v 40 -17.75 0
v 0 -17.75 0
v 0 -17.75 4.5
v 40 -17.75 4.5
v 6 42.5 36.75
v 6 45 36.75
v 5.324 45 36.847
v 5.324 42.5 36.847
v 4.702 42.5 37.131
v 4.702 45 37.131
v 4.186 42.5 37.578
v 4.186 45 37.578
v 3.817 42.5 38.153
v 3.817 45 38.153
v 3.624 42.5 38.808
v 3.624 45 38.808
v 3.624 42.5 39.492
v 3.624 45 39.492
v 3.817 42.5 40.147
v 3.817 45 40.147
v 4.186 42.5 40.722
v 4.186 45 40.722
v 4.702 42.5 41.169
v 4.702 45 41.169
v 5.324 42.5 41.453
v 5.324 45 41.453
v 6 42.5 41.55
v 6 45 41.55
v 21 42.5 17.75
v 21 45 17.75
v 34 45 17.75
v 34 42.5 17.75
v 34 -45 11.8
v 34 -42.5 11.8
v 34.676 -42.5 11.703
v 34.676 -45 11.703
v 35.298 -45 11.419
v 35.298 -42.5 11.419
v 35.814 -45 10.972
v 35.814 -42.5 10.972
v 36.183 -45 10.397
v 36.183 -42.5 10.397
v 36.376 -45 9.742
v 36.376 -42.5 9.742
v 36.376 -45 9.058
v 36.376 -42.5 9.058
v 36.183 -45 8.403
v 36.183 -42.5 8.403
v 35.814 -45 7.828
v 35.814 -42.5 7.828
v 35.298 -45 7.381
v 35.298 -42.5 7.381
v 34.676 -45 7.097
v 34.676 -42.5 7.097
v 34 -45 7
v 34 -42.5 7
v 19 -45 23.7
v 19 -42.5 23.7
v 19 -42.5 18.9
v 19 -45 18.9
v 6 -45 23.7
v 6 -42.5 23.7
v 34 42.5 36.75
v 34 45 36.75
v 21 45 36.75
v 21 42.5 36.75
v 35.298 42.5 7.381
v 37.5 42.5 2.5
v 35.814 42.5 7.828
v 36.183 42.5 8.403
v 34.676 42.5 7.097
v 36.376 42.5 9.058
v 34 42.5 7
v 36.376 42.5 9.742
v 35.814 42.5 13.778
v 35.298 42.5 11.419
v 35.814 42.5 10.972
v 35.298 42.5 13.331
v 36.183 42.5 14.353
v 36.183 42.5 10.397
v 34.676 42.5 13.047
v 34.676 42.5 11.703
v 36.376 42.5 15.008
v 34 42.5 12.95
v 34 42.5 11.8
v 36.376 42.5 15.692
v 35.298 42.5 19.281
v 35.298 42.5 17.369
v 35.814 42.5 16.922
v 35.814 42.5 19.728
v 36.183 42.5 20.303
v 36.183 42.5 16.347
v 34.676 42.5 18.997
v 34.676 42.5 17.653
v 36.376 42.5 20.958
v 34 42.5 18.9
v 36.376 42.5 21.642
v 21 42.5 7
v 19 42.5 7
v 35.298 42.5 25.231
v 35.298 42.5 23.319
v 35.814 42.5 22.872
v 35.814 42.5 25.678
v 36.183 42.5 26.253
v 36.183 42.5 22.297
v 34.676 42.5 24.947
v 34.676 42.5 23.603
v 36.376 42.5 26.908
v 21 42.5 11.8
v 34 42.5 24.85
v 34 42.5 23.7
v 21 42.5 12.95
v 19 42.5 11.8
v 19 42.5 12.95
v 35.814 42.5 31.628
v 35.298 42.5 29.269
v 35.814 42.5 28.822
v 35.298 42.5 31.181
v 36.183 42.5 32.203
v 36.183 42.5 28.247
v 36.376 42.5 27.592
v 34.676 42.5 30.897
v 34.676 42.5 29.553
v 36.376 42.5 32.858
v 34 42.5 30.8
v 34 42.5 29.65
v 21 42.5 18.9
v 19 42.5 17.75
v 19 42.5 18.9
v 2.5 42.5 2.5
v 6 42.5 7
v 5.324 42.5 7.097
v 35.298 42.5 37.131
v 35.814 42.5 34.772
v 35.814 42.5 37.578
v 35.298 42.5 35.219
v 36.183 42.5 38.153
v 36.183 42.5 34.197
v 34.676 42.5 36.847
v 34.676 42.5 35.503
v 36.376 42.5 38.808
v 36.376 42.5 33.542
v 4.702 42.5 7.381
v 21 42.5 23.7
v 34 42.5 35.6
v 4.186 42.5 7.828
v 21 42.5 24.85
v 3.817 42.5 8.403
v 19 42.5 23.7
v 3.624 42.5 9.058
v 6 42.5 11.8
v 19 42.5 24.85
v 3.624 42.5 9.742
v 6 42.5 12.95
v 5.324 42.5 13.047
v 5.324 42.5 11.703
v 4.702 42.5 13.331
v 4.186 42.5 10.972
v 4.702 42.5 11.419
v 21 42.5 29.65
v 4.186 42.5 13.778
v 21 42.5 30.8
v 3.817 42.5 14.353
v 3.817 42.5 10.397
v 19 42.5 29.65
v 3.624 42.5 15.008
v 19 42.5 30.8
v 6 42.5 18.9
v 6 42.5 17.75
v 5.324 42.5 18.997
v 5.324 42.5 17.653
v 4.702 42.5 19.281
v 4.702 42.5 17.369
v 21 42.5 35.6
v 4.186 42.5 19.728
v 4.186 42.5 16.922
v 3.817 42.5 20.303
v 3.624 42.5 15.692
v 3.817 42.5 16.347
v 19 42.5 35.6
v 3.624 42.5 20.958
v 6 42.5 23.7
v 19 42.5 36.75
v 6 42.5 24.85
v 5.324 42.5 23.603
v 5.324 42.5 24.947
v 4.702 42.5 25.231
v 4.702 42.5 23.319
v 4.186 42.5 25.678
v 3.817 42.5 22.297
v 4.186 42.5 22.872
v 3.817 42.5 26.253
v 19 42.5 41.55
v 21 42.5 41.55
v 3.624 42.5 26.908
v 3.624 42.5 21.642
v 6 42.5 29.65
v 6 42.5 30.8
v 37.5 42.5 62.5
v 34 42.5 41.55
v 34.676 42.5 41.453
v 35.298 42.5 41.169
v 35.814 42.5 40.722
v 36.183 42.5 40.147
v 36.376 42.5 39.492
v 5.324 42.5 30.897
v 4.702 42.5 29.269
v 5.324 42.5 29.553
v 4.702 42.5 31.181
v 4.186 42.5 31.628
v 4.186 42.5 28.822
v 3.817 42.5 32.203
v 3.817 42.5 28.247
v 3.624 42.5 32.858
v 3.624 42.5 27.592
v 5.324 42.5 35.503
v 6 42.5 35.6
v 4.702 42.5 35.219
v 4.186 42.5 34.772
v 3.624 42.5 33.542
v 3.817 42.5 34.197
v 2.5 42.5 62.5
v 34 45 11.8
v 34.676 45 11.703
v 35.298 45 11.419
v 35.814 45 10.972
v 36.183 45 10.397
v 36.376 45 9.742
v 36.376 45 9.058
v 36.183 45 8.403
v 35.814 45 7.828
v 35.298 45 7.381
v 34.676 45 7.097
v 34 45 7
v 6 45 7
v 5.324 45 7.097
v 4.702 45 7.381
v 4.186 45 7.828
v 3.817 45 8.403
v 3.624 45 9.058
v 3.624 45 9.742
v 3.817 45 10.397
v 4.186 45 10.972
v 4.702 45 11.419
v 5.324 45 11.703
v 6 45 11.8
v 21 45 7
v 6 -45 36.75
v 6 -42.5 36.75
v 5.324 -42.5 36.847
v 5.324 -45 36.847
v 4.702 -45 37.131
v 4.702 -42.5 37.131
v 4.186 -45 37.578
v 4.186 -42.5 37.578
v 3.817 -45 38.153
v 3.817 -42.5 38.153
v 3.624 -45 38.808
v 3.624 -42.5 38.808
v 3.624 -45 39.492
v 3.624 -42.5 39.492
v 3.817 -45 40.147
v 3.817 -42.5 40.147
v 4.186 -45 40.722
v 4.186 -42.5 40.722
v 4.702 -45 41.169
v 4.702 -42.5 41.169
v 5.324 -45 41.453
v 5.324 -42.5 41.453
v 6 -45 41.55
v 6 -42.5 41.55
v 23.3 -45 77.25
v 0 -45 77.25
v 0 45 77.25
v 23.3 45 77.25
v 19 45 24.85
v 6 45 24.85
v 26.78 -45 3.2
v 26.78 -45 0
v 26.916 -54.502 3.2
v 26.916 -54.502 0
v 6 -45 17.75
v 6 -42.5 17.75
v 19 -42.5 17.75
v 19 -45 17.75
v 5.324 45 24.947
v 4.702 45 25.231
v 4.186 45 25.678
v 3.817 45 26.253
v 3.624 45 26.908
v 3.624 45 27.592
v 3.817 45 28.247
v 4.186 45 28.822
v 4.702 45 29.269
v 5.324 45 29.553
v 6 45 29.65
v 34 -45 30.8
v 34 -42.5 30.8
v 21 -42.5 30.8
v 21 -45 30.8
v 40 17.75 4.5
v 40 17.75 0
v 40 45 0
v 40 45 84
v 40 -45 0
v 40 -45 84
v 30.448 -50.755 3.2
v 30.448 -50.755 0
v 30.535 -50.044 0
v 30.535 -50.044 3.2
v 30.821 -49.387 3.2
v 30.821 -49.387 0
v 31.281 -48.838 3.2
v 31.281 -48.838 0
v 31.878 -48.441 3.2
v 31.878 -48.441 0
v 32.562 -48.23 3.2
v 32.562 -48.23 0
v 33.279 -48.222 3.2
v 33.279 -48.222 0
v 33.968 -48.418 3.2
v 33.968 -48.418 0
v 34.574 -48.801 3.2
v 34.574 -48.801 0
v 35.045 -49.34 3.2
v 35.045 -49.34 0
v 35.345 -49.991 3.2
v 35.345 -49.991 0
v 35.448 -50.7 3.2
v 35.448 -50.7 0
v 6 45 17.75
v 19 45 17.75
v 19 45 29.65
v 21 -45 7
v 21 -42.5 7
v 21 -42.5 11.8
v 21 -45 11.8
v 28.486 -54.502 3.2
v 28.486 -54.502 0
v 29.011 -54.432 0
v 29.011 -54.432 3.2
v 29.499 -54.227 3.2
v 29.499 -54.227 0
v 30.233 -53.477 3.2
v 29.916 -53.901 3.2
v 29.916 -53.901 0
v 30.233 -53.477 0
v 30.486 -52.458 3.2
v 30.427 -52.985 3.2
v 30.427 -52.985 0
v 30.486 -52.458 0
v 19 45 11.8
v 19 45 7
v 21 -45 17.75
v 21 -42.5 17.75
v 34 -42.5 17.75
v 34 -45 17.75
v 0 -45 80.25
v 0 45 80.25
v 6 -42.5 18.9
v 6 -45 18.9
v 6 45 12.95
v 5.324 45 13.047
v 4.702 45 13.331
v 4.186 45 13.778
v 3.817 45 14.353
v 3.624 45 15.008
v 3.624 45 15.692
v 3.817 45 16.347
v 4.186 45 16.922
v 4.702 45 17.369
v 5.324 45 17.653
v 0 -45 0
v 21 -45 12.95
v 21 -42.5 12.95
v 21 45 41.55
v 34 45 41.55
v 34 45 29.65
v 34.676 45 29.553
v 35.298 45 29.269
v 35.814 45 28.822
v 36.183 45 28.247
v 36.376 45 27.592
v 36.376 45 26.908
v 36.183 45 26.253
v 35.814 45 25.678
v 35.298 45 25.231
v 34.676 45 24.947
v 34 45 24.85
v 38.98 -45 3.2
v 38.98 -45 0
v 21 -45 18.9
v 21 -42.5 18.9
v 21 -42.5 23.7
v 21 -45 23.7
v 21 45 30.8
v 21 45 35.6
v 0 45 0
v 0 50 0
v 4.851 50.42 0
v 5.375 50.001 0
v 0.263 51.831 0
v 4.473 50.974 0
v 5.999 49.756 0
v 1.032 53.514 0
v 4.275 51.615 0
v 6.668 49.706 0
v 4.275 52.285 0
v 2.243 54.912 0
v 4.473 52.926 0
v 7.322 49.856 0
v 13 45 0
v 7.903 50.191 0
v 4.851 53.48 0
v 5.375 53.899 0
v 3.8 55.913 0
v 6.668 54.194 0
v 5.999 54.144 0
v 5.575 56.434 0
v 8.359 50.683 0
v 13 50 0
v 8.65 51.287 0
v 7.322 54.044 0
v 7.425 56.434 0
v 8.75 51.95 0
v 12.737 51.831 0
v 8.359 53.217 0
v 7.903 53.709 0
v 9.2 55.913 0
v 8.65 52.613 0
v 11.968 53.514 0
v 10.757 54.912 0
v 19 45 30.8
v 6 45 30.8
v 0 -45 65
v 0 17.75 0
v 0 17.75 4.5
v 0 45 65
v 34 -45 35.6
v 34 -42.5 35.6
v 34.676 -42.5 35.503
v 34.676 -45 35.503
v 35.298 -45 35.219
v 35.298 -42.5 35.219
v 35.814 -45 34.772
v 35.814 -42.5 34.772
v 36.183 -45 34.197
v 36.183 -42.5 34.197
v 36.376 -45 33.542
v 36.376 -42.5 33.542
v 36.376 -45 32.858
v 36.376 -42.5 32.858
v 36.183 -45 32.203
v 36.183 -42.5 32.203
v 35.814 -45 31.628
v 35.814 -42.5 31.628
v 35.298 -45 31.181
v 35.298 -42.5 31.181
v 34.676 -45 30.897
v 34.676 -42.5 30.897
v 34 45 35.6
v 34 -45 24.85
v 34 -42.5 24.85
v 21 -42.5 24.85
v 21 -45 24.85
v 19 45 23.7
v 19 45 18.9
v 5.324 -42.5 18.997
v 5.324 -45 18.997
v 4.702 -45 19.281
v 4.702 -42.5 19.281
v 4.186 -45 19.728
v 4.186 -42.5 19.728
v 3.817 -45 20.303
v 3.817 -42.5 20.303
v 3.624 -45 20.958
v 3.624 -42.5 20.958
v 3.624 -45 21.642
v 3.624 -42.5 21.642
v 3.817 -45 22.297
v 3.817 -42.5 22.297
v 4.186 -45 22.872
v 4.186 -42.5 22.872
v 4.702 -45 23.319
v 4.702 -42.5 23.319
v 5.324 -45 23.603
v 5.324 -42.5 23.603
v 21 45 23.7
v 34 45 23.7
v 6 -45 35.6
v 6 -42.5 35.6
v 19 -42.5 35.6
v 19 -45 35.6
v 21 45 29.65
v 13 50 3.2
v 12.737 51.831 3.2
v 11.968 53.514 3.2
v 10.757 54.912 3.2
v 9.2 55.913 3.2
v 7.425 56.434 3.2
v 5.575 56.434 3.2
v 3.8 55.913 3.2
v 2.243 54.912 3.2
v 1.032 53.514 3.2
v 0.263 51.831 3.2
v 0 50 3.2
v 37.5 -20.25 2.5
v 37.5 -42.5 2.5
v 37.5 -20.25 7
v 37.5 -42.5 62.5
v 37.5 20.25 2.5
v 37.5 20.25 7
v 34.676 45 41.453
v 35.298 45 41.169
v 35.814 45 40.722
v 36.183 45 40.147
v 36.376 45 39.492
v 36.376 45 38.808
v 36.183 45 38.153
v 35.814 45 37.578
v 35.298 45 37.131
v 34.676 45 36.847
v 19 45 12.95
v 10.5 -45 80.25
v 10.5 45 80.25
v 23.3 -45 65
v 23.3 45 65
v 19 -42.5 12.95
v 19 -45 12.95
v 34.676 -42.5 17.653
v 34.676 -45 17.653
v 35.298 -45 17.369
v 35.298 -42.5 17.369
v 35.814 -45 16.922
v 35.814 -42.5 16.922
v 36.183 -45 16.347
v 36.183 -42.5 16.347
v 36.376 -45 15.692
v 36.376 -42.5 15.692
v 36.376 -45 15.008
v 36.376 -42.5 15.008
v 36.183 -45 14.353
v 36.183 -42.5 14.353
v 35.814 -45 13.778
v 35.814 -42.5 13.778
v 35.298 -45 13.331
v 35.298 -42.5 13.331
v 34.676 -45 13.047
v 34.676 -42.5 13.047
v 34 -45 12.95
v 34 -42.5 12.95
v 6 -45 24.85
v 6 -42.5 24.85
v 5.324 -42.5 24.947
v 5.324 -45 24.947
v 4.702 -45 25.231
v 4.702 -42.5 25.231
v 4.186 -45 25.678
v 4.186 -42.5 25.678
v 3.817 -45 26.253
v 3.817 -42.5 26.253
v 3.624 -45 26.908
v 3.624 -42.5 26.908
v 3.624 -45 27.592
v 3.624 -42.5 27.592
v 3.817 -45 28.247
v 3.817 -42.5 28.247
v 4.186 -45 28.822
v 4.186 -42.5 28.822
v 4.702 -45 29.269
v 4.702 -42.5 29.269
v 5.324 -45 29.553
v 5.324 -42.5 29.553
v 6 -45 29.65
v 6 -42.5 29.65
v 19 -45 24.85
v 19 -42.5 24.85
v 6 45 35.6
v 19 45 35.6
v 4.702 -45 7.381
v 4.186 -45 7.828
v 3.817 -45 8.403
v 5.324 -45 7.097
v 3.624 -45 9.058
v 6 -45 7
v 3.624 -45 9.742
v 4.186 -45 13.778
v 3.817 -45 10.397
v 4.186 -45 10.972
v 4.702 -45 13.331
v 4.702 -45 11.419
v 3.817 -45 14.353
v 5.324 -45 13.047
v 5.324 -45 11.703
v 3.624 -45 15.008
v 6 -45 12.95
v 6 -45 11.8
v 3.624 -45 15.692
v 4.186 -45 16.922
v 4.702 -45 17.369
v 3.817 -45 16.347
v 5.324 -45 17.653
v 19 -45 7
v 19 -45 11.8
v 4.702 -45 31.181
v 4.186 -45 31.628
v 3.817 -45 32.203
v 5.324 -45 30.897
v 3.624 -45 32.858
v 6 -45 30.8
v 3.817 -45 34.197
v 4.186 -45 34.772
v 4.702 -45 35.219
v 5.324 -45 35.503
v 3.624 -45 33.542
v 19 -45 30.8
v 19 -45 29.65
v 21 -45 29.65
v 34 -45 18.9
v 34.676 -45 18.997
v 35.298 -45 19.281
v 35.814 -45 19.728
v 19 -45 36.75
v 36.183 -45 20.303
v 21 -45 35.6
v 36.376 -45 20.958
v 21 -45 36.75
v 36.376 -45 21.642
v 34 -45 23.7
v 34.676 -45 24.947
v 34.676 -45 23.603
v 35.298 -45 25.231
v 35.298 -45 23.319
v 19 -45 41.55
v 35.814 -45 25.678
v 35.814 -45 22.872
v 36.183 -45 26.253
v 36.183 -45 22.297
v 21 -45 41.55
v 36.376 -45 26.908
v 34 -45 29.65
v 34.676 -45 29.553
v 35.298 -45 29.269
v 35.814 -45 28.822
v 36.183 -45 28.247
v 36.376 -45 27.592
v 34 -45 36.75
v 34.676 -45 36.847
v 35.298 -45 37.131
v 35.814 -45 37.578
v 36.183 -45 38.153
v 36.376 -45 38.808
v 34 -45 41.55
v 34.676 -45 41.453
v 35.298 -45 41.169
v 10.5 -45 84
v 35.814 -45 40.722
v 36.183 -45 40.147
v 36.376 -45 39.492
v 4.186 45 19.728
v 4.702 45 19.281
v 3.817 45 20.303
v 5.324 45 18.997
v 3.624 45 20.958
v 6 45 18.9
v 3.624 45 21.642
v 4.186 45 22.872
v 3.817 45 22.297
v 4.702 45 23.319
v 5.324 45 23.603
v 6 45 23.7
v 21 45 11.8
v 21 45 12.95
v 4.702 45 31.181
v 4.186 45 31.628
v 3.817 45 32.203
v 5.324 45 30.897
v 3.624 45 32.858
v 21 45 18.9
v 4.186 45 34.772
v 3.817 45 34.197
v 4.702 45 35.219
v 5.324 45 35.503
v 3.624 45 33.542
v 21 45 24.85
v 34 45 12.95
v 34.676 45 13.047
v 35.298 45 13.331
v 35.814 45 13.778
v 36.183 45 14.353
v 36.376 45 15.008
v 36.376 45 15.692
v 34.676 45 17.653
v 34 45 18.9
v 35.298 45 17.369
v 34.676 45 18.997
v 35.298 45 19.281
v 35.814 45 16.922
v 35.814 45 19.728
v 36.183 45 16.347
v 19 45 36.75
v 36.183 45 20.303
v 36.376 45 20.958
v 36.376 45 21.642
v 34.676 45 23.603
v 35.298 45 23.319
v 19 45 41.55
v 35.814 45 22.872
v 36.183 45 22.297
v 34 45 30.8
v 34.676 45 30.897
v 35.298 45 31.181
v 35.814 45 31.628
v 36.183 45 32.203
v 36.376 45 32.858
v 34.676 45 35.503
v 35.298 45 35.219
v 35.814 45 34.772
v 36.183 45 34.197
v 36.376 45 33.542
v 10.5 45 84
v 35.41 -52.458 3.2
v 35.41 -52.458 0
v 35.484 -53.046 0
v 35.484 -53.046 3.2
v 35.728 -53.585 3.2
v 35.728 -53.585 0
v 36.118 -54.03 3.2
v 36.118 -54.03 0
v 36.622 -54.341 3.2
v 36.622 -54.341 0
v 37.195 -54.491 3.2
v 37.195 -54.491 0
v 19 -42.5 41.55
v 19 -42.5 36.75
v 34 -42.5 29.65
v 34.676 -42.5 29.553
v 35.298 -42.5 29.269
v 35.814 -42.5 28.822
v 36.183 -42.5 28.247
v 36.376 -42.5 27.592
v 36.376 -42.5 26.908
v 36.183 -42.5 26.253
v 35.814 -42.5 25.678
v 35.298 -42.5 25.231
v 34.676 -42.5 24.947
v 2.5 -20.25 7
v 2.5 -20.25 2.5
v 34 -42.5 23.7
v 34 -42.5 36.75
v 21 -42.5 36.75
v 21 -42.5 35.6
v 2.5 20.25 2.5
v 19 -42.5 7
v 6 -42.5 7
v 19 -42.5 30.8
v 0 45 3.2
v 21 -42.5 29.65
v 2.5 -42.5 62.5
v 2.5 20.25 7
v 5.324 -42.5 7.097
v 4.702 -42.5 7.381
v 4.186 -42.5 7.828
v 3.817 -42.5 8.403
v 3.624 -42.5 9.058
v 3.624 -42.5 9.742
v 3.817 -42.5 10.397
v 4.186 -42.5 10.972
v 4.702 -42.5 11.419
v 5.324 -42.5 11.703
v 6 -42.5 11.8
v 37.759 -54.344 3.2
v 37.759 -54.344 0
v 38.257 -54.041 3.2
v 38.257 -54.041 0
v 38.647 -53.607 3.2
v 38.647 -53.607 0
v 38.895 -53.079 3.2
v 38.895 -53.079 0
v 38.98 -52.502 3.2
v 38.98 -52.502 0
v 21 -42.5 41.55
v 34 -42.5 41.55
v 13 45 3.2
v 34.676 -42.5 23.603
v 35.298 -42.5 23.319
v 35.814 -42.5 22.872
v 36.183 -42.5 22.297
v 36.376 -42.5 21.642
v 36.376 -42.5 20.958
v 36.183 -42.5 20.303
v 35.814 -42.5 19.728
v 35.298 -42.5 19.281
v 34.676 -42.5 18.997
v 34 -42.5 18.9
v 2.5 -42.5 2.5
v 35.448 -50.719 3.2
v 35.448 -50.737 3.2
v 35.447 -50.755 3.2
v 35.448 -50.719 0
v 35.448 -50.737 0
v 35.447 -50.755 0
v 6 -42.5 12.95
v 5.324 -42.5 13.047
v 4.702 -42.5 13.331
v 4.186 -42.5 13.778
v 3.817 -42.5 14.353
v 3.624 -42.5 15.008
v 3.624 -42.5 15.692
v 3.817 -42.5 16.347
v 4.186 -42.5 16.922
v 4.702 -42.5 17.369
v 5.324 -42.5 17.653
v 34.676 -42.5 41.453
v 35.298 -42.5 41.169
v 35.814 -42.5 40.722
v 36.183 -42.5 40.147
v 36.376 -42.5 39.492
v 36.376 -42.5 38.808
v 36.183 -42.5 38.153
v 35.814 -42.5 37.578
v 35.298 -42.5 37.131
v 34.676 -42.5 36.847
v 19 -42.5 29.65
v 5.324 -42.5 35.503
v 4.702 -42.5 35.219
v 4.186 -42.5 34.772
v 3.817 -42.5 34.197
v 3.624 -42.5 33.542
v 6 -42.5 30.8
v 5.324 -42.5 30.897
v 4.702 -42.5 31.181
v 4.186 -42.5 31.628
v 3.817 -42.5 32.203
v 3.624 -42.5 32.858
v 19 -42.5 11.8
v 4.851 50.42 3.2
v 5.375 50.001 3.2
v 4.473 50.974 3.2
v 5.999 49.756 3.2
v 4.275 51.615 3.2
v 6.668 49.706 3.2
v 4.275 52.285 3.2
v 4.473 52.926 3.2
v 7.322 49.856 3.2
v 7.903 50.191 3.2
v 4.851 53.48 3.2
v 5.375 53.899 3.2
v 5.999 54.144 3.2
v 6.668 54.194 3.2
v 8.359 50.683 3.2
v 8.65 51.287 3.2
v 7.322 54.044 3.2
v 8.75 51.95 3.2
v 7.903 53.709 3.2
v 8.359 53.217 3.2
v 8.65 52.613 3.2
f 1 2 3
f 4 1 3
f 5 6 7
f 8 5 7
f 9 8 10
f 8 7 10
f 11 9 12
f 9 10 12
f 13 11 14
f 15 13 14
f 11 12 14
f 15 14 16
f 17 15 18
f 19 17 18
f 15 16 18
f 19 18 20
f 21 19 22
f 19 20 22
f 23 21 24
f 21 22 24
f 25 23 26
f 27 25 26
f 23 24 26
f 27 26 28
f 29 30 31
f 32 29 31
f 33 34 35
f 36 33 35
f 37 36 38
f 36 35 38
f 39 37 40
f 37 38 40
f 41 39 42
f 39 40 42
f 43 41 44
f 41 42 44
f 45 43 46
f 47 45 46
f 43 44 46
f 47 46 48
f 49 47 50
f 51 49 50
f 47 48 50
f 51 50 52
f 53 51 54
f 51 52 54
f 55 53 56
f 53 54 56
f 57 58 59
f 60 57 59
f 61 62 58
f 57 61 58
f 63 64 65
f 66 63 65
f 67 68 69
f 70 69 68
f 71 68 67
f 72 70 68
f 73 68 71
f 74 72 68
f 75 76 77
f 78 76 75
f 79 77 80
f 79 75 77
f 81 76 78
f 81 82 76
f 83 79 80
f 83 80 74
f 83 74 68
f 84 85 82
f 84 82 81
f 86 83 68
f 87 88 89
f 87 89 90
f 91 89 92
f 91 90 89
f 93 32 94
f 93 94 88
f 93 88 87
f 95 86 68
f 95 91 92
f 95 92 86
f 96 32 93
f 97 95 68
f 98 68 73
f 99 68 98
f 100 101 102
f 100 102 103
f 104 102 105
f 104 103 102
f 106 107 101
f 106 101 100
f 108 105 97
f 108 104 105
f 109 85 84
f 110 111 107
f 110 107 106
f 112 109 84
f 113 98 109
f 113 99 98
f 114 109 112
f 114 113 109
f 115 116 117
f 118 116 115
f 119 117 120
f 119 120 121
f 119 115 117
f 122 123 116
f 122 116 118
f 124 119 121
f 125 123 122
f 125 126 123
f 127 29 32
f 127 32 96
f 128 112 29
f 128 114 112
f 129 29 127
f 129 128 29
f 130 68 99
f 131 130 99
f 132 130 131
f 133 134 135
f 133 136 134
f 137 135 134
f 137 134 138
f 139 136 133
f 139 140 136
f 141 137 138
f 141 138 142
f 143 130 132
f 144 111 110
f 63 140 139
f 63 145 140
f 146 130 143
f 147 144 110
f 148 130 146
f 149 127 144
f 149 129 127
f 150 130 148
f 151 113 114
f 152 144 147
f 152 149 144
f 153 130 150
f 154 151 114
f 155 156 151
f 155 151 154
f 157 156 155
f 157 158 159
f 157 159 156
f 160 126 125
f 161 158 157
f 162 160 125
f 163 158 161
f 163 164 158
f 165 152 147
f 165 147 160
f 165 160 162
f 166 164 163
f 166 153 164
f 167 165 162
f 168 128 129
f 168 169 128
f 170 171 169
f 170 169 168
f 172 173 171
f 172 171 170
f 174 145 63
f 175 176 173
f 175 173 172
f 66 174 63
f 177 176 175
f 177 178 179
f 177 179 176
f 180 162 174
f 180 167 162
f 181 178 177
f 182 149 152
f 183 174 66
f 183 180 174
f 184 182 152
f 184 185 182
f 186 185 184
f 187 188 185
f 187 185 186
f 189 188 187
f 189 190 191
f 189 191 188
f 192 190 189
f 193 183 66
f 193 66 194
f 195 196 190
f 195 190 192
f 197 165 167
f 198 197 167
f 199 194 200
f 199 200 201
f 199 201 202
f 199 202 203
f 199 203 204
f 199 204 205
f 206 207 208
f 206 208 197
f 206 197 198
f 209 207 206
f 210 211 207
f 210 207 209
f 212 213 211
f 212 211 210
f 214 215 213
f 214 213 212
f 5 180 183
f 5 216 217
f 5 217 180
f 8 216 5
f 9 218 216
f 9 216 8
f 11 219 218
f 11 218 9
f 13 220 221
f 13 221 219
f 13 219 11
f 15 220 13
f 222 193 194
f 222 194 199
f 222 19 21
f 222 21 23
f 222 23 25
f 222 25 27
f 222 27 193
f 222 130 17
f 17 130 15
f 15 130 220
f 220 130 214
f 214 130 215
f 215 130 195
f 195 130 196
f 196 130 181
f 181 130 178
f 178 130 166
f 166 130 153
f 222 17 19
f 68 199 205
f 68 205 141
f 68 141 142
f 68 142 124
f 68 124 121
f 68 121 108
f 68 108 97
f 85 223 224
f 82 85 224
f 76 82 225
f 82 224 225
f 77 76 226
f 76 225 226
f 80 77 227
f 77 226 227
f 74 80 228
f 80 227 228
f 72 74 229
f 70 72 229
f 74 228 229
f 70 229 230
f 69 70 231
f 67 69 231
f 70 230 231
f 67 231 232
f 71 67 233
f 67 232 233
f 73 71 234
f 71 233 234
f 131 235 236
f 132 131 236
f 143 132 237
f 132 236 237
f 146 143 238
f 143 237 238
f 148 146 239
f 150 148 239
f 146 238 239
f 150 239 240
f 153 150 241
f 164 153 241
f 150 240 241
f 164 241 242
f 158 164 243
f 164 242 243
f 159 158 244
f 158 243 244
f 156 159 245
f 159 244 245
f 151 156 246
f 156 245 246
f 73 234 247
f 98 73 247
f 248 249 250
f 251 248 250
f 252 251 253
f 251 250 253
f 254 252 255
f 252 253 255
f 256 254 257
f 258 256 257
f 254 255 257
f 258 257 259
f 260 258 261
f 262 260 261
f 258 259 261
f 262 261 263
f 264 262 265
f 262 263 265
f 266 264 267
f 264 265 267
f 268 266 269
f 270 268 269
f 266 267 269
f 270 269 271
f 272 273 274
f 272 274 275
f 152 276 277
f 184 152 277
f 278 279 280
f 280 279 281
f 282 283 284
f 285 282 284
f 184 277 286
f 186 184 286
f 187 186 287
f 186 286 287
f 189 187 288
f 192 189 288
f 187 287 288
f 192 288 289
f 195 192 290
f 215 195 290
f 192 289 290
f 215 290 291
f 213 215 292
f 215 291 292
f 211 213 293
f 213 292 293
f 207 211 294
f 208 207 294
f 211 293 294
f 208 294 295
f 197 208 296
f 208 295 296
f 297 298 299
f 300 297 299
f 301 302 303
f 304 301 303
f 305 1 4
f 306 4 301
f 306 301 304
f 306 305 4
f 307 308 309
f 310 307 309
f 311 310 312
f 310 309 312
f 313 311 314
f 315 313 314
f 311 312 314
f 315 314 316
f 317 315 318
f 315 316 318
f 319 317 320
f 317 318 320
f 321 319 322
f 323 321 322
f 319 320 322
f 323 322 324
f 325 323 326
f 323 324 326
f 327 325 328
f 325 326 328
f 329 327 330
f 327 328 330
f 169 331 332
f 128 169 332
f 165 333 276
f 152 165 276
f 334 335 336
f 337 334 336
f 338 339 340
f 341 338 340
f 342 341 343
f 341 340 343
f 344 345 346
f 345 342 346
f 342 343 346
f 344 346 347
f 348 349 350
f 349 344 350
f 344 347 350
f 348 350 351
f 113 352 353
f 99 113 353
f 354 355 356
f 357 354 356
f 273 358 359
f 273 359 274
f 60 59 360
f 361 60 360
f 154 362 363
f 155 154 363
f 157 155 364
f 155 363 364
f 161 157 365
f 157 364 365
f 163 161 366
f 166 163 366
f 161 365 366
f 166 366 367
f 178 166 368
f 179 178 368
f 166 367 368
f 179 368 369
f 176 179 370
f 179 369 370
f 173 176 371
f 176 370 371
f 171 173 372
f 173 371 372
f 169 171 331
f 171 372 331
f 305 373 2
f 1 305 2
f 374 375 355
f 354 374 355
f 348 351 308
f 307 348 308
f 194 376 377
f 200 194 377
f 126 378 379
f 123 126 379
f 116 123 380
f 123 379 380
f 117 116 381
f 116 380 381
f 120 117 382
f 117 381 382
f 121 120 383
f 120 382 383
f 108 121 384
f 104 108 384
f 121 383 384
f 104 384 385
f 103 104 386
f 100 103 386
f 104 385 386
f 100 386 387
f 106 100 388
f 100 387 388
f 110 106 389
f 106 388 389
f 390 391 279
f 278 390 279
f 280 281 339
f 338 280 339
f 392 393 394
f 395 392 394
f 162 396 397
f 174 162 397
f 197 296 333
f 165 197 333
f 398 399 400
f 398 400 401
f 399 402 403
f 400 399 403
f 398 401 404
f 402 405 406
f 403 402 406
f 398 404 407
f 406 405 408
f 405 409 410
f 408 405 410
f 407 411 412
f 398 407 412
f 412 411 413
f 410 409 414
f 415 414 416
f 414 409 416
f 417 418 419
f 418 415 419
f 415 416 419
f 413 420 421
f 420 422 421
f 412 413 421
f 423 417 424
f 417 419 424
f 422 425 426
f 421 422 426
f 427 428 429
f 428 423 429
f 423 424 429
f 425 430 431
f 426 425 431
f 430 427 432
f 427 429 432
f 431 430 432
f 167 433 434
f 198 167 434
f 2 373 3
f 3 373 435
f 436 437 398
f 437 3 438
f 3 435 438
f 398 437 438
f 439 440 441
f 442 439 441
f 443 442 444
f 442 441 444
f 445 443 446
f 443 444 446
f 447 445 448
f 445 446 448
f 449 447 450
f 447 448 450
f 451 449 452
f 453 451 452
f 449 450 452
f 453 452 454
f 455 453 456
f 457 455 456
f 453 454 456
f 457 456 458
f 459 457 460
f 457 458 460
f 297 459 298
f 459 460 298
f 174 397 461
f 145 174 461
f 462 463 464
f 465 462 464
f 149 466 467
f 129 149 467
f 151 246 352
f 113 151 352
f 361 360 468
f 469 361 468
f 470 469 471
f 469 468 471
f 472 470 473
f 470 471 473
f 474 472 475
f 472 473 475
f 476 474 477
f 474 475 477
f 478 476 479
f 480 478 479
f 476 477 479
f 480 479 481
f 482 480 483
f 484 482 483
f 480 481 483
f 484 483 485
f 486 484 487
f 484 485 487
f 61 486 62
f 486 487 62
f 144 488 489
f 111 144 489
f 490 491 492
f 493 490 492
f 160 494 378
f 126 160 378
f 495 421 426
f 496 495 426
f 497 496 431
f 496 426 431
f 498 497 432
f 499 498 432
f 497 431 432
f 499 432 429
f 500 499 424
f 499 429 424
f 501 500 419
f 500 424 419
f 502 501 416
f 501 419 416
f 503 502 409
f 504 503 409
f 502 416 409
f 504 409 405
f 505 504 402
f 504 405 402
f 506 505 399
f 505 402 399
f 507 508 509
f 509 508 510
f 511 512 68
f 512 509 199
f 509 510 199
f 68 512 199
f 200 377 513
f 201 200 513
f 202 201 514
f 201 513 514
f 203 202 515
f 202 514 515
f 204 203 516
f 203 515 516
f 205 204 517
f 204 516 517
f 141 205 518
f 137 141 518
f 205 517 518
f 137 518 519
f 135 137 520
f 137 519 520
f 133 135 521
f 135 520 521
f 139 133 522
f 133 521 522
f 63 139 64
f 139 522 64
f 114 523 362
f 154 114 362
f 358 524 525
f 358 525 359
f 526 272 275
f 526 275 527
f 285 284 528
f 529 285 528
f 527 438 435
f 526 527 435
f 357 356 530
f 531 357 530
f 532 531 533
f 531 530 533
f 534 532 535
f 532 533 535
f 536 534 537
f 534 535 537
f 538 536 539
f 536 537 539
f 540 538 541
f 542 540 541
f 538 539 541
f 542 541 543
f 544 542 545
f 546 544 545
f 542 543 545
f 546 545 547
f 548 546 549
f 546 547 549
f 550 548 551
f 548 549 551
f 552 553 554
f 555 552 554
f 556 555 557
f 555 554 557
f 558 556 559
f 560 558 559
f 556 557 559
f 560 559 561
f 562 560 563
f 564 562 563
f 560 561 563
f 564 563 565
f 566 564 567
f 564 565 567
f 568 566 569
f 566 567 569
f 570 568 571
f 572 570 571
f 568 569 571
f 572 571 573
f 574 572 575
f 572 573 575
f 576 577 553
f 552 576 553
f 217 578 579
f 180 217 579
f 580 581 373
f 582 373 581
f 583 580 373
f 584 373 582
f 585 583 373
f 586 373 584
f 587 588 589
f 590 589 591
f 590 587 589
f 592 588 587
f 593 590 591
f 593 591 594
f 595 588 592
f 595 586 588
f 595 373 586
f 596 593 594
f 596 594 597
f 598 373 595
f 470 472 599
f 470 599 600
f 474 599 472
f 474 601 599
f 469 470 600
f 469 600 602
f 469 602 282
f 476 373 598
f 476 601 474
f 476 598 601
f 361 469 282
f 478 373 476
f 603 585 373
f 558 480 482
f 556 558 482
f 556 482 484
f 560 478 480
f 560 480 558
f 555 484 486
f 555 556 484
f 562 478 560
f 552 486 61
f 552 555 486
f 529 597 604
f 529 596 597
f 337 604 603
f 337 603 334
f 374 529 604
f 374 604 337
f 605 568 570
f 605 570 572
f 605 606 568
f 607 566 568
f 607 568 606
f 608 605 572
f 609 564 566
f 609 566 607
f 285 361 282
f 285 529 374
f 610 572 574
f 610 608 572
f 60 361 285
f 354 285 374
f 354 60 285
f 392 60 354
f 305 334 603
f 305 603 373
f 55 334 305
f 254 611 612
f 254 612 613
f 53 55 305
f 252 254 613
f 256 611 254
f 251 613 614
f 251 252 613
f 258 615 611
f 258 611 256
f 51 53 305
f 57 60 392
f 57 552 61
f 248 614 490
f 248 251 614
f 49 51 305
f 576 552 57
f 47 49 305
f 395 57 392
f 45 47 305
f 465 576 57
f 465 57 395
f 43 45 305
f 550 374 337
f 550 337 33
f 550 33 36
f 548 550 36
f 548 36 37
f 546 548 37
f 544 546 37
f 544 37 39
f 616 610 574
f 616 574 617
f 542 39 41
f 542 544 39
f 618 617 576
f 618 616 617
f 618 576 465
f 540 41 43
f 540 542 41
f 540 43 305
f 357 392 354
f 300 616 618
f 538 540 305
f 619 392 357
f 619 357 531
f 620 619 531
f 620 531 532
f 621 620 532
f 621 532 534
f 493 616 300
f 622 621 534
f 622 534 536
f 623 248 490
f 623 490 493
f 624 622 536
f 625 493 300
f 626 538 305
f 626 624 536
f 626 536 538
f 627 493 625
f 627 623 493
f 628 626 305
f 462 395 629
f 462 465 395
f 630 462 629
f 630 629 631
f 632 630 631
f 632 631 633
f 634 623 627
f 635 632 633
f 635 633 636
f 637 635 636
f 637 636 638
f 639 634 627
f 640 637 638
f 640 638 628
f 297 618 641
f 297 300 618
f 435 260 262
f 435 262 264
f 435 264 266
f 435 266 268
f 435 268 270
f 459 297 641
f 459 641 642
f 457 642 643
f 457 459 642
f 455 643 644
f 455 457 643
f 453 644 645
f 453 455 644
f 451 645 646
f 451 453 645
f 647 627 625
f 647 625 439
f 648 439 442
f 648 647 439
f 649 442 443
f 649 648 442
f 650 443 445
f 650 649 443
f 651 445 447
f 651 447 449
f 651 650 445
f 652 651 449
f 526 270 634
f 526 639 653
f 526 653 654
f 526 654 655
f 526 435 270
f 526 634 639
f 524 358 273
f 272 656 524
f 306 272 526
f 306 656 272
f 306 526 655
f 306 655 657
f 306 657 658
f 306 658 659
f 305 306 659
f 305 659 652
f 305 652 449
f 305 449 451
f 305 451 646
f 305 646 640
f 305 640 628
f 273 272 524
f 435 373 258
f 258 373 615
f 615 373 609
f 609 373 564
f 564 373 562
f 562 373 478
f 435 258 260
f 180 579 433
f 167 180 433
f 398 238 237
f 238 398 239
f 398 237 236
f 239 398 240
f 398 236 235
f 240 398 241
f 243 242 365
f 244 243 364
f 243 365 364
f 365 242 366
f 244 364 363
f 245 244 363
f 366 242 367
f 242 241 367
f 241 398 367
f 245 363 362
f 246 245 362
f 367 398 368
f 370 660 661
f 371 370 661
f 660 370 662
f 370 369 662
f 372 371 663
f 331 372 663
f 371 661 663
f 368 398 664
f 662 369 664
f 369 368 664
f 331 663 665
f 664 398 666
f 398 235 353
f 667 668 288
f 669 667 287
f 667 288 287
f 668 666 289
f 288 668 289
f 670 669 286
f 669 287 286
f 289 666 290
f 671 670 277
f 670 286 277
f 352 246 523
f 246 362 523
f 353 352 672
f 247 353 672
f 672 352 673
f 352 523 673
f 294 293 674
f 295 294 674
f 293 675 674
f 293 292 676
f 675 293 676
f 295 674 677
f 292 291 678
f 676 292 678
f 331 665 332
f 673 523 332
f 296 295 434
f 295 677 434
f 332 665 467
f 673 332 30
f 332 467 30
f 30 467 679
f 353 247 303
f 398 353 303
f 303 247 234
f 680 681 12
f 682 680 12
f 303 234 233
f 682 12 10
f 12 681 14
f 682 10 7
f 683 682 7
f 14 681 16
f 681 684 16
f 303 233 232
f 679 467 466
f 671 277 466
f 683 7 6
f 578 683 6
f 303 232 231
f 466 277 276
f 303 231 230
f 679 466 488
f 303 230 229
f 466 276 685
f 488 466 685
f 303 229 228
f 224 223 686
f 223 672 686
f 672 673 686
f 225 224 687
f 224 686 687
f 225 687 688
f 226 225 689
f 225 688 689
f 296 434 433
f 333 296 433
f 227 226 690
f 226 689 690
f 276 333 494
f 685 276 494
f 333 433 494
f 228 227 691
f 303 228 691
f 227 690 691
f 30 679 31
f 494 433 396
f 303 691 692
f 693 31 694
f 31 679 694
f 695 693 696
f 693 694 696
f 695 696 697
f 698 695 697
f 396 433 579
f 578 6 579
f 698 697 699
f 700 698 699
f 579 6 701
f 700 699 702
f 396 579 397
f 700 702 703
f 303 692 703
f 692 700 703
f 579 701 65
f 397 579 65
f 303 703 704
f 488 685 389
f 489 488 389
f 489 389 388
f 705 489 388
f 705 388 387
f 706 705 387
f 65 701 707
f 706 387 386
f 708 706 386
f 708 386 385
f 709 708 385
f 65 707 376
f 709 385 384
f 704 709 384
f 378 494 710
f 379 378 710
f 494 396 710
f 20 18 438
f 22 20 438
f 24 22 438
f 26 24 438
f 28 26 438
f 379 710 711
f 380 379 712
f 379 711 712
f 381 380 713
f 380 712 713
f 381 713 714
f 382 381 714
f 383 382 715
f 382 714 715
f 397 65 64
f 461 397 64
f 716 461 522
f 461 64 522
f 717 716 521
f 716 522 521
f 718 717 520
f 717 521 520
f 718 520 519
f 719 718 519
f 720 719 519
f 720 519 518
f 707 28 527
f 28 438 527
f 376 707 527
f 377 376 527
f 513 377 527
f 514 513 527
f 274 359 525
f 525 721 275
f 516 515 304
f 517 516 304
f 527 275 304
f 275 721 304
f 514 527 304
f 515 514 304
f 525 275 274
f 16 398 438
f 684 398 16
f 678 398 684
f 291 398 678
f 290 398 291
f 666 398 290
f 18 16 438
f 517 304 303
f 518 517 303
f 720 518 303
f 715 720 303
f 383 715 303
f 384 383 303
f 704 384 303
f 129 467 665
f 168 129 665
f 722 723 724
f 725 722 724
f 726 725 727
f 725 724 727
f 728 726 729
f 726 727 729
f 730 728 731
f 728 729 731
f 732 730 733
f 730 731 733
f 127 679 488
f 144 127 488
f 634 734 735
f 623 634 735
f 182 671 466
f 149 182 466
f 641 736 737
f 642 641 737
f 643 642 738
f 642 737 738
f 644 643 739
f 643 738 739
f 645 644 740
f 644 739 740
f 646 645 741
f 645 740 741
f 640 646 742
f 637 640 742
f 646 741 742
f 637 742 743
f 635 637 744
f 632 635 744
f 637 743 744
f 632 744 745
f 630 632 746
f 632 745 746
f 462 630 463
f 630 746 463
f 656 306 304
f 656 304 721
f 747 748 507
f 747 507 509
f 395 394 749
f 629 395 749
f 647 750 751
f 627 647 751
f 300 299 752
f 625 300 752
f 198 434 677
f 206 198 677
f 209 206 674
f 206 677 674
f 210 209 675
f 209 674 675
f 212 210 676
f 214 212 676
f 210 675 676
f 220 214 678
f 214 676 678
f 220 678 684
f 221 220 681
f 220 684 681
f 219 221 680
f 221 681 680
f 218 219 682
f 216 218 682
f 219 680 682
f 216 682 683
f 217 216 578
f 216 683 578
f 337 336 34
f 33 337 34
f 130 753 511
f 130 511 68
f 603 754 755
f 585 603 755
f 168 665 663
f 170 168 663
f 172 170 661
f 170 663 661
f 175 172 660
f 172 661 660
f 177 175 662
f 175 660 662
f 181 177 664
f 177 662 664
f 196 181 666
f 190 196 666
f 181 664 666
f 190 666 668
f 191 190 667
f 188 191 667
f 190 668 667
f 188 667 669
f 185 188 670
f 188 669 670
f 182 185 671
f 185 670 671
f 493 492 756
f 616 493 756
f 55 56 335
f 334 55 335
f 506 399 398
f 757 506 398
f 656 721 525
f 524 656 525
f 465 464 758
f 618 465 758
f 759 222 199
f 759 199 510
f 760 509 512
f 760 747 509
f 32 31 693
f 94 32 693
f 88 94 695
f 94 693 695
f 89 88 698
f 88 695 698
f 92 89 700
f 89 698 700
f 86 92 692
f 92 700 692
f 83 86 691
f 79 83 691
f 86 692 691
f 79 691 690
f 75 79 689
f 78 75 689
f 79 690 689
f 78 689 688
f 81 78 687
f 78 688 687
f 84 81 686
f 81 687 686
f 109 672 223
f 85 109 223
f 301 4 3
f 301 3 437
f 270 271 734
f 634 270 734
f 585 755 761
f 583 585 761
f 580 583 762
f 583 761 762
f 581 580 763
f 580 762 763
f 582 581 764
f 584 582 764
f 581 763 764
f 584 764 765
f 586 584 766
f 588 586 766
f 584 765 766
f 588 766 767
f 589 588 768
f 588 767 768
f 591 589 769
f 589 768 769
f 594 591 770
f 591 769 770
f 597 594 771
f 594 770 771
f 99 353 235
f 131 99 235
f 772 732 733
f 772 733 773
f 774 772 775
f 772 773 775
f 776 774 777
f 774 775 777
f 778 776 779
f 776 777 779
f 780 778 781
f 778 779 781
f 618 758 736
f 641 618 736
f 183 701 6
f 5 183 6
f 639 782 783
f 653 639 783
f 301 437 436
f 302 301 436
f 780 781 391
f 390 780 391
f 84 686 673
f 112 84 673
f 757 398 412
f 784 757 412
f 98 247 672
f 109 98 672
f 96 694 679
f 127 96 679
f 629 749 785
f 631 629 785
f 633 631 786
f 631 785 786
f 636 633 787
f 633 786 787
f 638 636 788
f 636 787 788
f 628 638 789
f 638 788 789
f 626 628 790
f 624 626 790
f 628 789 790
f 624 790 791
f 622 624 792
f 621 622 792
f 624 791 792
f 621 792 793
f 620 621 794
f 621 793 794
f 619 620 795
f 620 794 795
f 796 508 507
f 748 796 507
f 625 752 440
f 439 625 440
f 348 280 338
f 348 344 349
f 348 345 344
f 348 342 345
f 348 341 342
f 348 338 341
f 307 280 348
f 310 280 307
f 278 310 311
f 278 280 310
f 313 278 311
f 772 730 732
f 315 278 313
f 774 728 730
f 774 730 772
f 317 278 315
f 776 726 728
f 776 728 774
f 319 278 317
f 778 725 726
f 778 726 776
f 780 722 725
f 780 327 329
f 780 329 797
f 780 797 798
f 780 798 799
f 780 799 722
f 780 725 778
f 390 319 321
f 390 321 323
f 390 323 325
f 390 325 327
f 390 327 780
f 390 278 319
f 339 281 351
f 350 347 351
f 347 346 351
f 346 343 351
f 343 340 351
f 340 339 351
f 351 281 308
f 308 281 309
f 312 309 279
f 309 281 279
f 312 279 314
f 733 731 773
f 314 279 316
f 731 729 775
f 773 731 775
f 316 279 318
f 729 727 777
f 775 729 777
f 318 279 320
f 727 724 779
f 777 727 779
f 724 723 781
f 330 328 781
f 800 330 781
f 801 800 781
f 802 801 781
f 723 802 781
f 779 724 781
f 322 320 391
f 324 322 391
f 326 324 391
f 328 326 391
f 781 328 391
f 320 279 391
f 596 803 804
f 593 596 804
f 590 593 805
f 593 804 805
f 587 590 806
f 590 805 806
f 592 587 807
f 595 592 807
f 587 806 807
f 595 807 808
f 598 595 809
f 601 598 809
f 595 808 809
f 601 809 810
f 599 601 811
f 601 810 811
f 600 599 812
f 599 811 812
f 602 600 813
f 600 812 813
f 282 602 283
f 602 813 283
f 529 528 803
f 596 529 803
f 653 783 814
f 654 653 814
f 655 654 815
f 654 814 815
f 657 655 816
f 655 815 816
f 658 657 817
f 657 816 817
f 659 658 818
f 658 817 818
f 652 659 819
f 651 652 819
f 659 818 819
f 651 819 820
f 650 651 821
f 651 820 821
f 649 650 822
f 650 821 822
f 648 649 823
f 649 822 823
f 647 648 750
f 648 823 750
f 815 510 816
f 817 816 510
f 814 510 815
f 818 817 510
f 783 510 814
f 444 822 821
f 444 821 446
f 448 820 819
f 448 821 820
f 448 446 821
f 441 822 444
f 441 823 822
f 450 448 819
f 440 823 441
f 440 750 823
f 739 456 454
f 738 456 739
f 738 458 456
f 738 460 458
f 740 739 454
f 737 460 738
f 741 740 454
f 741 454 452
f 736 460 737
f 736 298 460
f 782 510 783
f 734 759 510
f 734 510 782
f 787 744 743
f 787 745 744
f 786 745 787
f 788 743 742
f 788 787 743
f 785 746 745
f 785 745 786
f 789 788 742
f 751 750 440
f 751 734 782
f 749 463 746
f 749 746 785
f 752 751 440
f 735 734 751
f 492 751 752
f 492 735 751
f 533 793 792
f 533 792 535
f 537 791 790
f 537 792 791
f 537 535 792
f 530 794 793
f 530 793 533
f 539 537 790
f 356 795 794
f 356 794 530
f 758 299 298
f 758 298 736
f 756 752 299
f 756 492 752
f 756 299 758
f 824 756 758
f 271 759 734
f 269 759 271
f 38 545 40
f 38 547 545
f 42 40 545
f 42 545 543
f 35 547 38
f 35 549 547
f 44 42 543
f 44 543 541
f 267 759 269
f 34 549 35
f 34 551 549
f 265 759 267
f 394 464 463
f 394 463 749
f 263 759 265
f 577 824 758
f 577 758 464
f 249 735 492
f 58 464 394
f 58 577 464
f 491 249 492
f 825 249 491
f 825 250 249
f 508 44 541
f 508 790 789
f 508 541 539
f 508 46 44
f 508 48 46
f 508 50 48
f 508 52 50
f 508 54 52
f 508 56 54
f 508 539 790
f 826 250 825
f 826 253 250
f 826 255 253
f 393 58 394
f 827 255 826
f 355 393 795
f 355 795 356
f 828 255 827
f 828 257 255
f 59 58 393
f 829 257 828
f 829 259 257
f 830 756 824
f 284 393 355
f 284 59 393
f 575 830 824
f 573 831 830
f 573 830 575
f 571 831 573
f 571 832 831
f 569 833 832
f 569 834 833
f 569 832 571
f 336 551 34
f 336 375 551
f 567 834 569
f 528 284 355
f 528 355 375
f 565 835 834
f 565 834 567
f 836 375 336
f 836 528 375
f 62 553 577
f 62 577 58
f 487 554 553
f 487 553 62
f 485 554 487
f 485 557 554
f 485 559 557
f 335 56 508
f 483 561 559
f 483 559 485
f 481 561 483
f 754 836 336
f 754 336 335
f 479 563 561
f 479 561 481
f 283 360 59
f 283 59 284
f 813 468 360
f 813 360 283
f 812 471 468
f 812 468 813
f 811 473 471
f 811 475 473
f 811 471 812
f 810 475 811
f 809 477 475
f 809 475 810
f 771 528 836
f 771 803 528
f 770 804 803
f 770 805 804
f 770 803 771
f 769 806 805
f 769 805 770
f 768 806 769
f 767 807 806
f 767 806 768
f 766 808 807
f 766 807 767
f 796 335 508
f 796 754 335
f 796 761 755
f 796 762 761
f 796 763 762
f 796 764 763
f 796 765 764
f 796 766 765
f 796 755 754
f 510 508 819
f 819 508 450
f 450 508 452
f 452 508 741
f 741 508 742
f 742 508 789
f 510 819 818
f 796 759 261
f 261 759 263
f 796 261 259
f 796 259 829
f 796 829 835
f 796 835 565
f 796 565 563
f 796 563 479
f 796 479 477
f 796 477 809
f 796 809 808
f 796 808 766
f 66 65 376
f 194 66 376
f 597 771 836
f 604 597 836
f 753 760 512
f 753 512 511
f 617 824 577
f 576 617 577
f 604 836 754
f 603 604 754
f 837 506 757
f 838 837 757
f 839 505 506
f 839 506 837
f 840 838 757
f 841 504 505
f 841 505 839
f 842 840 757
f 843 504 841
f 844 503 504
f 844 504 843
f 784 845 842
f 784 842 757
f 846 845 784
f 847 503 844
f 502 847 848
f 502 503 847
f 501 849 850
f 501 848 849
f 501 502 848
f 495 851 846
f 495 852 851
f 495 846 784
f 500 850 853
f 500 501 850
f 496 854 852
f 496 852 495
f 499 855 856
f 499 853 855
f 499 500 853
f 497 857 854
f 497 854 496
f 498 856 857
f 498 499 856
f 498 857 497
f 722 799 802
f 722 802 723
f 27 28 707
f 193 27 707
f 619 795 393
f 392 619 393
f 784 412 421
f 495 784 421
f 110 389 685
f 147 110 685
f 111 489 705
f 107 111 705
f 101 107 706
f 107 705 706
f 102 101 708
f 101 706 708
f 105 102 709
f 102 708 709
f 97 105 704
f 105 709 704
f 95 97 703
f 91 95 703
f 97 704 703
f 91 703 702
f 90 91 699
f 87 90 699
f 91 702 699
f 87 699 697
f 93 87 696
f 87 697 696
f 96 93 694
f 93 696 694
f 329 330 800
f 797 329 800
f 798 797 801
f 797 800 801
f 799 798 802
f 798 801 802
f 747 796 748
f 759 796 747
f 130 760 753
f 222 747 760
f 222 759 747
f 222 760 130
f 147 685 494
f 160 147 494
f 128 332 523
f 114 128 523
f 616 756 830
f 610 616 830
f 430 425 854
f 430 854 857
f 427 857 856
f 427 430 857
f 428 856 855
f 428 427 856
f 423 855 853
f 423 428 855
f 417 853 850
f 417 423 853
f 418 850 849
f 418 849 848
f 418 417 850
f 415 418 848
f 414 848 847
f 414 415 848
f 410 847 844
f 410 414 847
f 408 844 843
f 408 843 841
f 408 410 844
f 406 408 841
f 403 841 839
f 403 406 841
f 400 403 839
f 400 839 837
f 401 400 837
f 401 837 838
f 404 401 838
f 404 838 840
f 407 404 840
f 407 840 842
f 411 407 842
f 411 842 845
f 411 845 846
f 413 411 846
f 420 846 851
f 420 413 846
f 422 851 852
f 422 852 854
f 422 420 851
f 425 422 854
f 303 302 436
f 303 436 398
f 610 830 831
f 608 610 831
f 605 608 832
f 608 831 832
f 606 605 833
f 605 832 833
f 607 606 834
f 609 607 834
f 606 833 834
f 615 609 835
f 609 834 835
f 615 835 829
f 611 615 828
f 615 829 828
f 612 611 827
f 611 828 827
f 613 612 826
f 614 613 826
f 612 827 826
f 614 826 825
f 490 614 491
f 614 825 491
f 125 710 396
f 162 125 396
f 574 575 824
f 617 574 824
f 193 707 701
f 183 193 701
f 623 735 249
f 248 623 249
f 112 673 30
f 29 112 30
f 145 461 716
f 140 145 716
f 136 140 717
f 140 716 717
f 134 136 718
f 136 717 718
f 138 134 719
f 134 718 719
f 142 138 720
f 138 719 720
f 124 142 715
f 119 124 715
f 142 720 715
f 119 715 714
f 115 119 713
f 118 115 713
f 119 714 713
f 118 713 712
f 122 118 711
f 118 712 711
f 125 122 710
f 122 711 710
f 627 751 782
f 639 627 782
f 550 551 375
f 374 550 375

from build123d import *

# Parameters (mm, degrees)
F1_DEPTH    = 40
F3_T        = -2.5
F4_DEPTH    = 90.001
F6_DEPTH    = 90
F7_R        = 2.25
F8_DEPTH    = 3.2
F9_T1_DEPTH = 13.4224852585
F9_T3_DEPTH = 13.2


# Not quite as in the source:
# - a fillet or chamfer that OpenCascade refuses, or shapes differently, is made with other operations: its cross-section is extruded or revolved along the edge and cut away or added


with BuildPart() as f1:
    # F0 (on Right) → F1 (new body)
    with BuildSketch(Plane.YZ):
        Polygon((-45, 0), (-17.75, 0), (-17.75, 4.5), (17.75, 4.5), (17.75, 0), (45, 0), (45, 65), (-45, 65), align=None)
    extrude(amount=F1_DEPTH)

    # F3 (hollow: no face is removed)
    offset(amount=F3_T, kind=Kind.INTERSECTION, mode=Mode.SUBTRACT)

    # F2 (on face) → F4 (cut, through all)
    with BuildSketch(Plane(origin=(0, 45, 0), x_dir=(-1, 0, 0), z_dir=(0, 1, 0))):
        with BuildLine():
            Line((-21, 36.75), (-21, 41.55))
            Line((-21, 41.55), (-34, 41.55))
            ThreePointArc((-34, 41.55), (-36.4, 39.15), (-34, 36.75))
            Line((-34, 36.75), (-21, 36.75))
        make_face()
        with BuildLine():
            Line((-19, 41.55), (-19, 36.75))
            Line((-19, 36.75), (-6, 36.75))
            ThreePointArc((-6, 36.75), (-3.6, 39.15), (-6, 41.55))
            Line((-6, 41.55), (-19, 41.55))
        make_face()
        with BuildLine():
            Line((-19, 35.6), (-19, 30.8))
            Line((-19, 30.8), (-6, 30.8))
            ThreePointArc((-6, 30.8), (-3.6, 33.2), (-6, 35.6))
            Line((-6, 35.6), (-19, 35.6))
        make_face()
        with BuildLine():
            Line((-21, 30.8), (-21, 35.6))
            Line((-21, 35.6), (-34, 35.6))
            ThreePointArc((-34, 35.6), (-36.4, 33.2), (-34, 30.8))
            Line((-34, 30.8), (-21, 30.8))
        make_face()
        with BuildLine():
            Line((-21, 24.85), (-21, 29.65))
            Line((-21, 29.65), (-34, 29.65))
            ThreePointArc((-34, 29.65), (-36.4, 27.25), (-34, 24.85))
            Line((-34, 24.85), (-21, 24.85))
        make_face()
        with BuildLine():
            Line((-19, 29.65), (-19, 24.85))
            Line((-19, 24.85), (-6, 24.85))
            ThreePointArc((-6, 24.85), (-3.6, 27.25), (-6, 29.65))
            Line((-6, 29.65), (-19, 29.65))
        make_face()
        with BuildLine():
            Line((-21, 18.9), (-21, 23.7))
            Line((-21, 23.7), (-34, 23.7))
            ThreePointArc((-34, 23.7), (-36.4, 21.3), (-34, 18.9))
            Line((-34, 18.9), (-21, 18.9))
        make_face()
        with BuildLine():
            Line((-19, 23.7), (-19, 18.9))
            Line((-19, 18.9), (-6, 18.9))
            ThreePointArc((-6, 18.9), (-3.6, 21.3), (-6, 23.7))
            Line((-6, 23.7), (-19, 23.7))
        make_face()
        with BuildLine():
            Line((-21, 12.95), (-21, 17.75))
            Line((-21, 17.75), (-34, 17.75))
            ThreePointArc((-34, 17.75), (-36.4, 15.35), (-34, 12.95))
            Line((-34, 12.95), (-21, 12.95))
        make_face()
        with BuildLine():
            Line((-19, 17.75), (-19, 12.95))
            Line((-19, 12.95), (-6, 12.95))
            ThreePointArc((-6, 12.95), (-3.6, 15.35), (-6, 17.75))
            Line((-6, 17.75), (-19, 17.75))
        make_face()
        with BuildLine():
            Line((-34, 7), (-21, 7))
            Line((-21, 7), (-21, 11.8))
            Line((-21, 11.8), (-34, 11.8))
            ThreePointArc((-34, 11.8), (-36.4, 9.4), (-34, 7))
        make_face()
        with BuildLine():
            Line((-19, 11.8), (-19, 7))
            Line((-19, 7), (-6, 7))
            ThreePointArc((-6, 7), (-3.6, 9.4), (-6, 11.8))
            Line((-6, 11.8), (-19, 11.8))
        make_face()
    extrude(amount=-F4_DEPTH, mode=Mode.SUBTRACT)

    # F5 (on face) → F6 (join)
    with BuildSketch(Plane.XZ.offset(45)):
        Polygon((23.3, 65), (40, 65), (40, 84), (10.5, 84), (10.5, 80.25), (0, 80.25), (0, 77.25), (23.3, 77.25), align=None)
    extrude(amount=-F6_DEPTH)


with BuildPart() as f8:
    # F7 (on Top) → F8 (new body)
    with BuildSketch(Plane.XY):
        with BuildLine():
            Line((0, 50.0000204146), (0, 45.0000204146))
            Line((0, 45.0000204146), (13, 45.0000204146))
            Line((13, 45.0000204146), (13, 50.0000204146))
            ThreePointArc((13, 50.0000204146), (6.5, 56.5000204146), (0, 50.0000204146))
        make_face()
        with Locations((6.5, 51.9500204146)):
            Circle(F7_R, mode=Mode.SUBTRACT)
    extrude(amount=F8_DEPTH)


with BuildPart() as f8b:
    # F7 (on Top) → F8, piece 2 (new body)
    with BuildSketch(Plane.XY):
        with BuildLine():
            Line((38.9799938861, -54.5024834573), (38.9799938861, -45.0004808827))
            Line((38.9799938861, -45.0004808827), (26.7799938861, -45.0004808827))
            Line((26.7799938861, -45.0004808827), (26.9155632704, -54.5024834573))
            Line((26.9155632704, -54.5024834573), (30.5308417415, -54.5024834573))
            Line((30.5308417415, -54.5024834573), (30.4483837113, -50.755483601))
            ThreePointArc((30.4483837113, -50.755483601), (32.9202755548, -48.2006321706), (35.4477785783, -50.7004808827))
            ThreePointArc((35.4477785783, -50.7004808827), (35.4476272904, -50.7279839062), (35.4471734452, -50.755483601))
            Line((35.4471734452, -50.755483601), (35.364715415, -54.5024834573))
            Line((35.364715415, -54.5024834573), (38.9799938861, -54.5024834573))
        make_face()
    extrude(amount=F8_DEPTH)

    # F9: fillet of radius 2 on 3 edges, made by hand

    # F9_s2 → F9_t1 (cut)
    with BuildSketch(Plane.XY.offset(-5.1112426292)):
        with BuildLine():
            ThreePointArc((28.4863446898, -54.5024834573), (29.9160307304, -53.9010533789), (30.4858605834, -52.4584812827))
            Line((30.4858605834, -52.4584812827), (30.5308417415, -54.5024834573))
            Line((30.5308417415, -54.5024834573), (28.4863446898, -54.5024834573))
        make_face()
        with BuildLine():
            ThreePointArc((35.4096965732, -52.4584812827), (35.9795264262, -53.9010533789), (37.4092124667, -54.5024834573))
            Line((37.4092124667, -54.5024834573), (35.364715415, -54.5024834573))
            Line((35.364715415, -54.5024834573), (35.4096965732, -52.4584812827))
        make_face()
    extrude(amount=F9_T1_DEPTH, mode=Mode.SUBTRACT)

    # F9_s4 → F9_t3 (cut)
    with BuildSketch(Plane.XY.offset(-5)):
        with BuildLine():
            ThreePointArc((36.9799938861, -54.5024834573), (38.3942074485, -53.9166970197), (38.9799938861, -52.5024834573))
            Line((38.9799938861, -52.5024834573), (38.9799938861, -54.5024834573))
            Line((38.9799938861, -54.5024834573), (36.9799938861, -54.5024834573))
        make_face()
    extrude(amount=F9_T3_DEPTH, mode=Mode.SUBTRACT)


solid = Compound([f1.part, f8.part, f8b.part])
